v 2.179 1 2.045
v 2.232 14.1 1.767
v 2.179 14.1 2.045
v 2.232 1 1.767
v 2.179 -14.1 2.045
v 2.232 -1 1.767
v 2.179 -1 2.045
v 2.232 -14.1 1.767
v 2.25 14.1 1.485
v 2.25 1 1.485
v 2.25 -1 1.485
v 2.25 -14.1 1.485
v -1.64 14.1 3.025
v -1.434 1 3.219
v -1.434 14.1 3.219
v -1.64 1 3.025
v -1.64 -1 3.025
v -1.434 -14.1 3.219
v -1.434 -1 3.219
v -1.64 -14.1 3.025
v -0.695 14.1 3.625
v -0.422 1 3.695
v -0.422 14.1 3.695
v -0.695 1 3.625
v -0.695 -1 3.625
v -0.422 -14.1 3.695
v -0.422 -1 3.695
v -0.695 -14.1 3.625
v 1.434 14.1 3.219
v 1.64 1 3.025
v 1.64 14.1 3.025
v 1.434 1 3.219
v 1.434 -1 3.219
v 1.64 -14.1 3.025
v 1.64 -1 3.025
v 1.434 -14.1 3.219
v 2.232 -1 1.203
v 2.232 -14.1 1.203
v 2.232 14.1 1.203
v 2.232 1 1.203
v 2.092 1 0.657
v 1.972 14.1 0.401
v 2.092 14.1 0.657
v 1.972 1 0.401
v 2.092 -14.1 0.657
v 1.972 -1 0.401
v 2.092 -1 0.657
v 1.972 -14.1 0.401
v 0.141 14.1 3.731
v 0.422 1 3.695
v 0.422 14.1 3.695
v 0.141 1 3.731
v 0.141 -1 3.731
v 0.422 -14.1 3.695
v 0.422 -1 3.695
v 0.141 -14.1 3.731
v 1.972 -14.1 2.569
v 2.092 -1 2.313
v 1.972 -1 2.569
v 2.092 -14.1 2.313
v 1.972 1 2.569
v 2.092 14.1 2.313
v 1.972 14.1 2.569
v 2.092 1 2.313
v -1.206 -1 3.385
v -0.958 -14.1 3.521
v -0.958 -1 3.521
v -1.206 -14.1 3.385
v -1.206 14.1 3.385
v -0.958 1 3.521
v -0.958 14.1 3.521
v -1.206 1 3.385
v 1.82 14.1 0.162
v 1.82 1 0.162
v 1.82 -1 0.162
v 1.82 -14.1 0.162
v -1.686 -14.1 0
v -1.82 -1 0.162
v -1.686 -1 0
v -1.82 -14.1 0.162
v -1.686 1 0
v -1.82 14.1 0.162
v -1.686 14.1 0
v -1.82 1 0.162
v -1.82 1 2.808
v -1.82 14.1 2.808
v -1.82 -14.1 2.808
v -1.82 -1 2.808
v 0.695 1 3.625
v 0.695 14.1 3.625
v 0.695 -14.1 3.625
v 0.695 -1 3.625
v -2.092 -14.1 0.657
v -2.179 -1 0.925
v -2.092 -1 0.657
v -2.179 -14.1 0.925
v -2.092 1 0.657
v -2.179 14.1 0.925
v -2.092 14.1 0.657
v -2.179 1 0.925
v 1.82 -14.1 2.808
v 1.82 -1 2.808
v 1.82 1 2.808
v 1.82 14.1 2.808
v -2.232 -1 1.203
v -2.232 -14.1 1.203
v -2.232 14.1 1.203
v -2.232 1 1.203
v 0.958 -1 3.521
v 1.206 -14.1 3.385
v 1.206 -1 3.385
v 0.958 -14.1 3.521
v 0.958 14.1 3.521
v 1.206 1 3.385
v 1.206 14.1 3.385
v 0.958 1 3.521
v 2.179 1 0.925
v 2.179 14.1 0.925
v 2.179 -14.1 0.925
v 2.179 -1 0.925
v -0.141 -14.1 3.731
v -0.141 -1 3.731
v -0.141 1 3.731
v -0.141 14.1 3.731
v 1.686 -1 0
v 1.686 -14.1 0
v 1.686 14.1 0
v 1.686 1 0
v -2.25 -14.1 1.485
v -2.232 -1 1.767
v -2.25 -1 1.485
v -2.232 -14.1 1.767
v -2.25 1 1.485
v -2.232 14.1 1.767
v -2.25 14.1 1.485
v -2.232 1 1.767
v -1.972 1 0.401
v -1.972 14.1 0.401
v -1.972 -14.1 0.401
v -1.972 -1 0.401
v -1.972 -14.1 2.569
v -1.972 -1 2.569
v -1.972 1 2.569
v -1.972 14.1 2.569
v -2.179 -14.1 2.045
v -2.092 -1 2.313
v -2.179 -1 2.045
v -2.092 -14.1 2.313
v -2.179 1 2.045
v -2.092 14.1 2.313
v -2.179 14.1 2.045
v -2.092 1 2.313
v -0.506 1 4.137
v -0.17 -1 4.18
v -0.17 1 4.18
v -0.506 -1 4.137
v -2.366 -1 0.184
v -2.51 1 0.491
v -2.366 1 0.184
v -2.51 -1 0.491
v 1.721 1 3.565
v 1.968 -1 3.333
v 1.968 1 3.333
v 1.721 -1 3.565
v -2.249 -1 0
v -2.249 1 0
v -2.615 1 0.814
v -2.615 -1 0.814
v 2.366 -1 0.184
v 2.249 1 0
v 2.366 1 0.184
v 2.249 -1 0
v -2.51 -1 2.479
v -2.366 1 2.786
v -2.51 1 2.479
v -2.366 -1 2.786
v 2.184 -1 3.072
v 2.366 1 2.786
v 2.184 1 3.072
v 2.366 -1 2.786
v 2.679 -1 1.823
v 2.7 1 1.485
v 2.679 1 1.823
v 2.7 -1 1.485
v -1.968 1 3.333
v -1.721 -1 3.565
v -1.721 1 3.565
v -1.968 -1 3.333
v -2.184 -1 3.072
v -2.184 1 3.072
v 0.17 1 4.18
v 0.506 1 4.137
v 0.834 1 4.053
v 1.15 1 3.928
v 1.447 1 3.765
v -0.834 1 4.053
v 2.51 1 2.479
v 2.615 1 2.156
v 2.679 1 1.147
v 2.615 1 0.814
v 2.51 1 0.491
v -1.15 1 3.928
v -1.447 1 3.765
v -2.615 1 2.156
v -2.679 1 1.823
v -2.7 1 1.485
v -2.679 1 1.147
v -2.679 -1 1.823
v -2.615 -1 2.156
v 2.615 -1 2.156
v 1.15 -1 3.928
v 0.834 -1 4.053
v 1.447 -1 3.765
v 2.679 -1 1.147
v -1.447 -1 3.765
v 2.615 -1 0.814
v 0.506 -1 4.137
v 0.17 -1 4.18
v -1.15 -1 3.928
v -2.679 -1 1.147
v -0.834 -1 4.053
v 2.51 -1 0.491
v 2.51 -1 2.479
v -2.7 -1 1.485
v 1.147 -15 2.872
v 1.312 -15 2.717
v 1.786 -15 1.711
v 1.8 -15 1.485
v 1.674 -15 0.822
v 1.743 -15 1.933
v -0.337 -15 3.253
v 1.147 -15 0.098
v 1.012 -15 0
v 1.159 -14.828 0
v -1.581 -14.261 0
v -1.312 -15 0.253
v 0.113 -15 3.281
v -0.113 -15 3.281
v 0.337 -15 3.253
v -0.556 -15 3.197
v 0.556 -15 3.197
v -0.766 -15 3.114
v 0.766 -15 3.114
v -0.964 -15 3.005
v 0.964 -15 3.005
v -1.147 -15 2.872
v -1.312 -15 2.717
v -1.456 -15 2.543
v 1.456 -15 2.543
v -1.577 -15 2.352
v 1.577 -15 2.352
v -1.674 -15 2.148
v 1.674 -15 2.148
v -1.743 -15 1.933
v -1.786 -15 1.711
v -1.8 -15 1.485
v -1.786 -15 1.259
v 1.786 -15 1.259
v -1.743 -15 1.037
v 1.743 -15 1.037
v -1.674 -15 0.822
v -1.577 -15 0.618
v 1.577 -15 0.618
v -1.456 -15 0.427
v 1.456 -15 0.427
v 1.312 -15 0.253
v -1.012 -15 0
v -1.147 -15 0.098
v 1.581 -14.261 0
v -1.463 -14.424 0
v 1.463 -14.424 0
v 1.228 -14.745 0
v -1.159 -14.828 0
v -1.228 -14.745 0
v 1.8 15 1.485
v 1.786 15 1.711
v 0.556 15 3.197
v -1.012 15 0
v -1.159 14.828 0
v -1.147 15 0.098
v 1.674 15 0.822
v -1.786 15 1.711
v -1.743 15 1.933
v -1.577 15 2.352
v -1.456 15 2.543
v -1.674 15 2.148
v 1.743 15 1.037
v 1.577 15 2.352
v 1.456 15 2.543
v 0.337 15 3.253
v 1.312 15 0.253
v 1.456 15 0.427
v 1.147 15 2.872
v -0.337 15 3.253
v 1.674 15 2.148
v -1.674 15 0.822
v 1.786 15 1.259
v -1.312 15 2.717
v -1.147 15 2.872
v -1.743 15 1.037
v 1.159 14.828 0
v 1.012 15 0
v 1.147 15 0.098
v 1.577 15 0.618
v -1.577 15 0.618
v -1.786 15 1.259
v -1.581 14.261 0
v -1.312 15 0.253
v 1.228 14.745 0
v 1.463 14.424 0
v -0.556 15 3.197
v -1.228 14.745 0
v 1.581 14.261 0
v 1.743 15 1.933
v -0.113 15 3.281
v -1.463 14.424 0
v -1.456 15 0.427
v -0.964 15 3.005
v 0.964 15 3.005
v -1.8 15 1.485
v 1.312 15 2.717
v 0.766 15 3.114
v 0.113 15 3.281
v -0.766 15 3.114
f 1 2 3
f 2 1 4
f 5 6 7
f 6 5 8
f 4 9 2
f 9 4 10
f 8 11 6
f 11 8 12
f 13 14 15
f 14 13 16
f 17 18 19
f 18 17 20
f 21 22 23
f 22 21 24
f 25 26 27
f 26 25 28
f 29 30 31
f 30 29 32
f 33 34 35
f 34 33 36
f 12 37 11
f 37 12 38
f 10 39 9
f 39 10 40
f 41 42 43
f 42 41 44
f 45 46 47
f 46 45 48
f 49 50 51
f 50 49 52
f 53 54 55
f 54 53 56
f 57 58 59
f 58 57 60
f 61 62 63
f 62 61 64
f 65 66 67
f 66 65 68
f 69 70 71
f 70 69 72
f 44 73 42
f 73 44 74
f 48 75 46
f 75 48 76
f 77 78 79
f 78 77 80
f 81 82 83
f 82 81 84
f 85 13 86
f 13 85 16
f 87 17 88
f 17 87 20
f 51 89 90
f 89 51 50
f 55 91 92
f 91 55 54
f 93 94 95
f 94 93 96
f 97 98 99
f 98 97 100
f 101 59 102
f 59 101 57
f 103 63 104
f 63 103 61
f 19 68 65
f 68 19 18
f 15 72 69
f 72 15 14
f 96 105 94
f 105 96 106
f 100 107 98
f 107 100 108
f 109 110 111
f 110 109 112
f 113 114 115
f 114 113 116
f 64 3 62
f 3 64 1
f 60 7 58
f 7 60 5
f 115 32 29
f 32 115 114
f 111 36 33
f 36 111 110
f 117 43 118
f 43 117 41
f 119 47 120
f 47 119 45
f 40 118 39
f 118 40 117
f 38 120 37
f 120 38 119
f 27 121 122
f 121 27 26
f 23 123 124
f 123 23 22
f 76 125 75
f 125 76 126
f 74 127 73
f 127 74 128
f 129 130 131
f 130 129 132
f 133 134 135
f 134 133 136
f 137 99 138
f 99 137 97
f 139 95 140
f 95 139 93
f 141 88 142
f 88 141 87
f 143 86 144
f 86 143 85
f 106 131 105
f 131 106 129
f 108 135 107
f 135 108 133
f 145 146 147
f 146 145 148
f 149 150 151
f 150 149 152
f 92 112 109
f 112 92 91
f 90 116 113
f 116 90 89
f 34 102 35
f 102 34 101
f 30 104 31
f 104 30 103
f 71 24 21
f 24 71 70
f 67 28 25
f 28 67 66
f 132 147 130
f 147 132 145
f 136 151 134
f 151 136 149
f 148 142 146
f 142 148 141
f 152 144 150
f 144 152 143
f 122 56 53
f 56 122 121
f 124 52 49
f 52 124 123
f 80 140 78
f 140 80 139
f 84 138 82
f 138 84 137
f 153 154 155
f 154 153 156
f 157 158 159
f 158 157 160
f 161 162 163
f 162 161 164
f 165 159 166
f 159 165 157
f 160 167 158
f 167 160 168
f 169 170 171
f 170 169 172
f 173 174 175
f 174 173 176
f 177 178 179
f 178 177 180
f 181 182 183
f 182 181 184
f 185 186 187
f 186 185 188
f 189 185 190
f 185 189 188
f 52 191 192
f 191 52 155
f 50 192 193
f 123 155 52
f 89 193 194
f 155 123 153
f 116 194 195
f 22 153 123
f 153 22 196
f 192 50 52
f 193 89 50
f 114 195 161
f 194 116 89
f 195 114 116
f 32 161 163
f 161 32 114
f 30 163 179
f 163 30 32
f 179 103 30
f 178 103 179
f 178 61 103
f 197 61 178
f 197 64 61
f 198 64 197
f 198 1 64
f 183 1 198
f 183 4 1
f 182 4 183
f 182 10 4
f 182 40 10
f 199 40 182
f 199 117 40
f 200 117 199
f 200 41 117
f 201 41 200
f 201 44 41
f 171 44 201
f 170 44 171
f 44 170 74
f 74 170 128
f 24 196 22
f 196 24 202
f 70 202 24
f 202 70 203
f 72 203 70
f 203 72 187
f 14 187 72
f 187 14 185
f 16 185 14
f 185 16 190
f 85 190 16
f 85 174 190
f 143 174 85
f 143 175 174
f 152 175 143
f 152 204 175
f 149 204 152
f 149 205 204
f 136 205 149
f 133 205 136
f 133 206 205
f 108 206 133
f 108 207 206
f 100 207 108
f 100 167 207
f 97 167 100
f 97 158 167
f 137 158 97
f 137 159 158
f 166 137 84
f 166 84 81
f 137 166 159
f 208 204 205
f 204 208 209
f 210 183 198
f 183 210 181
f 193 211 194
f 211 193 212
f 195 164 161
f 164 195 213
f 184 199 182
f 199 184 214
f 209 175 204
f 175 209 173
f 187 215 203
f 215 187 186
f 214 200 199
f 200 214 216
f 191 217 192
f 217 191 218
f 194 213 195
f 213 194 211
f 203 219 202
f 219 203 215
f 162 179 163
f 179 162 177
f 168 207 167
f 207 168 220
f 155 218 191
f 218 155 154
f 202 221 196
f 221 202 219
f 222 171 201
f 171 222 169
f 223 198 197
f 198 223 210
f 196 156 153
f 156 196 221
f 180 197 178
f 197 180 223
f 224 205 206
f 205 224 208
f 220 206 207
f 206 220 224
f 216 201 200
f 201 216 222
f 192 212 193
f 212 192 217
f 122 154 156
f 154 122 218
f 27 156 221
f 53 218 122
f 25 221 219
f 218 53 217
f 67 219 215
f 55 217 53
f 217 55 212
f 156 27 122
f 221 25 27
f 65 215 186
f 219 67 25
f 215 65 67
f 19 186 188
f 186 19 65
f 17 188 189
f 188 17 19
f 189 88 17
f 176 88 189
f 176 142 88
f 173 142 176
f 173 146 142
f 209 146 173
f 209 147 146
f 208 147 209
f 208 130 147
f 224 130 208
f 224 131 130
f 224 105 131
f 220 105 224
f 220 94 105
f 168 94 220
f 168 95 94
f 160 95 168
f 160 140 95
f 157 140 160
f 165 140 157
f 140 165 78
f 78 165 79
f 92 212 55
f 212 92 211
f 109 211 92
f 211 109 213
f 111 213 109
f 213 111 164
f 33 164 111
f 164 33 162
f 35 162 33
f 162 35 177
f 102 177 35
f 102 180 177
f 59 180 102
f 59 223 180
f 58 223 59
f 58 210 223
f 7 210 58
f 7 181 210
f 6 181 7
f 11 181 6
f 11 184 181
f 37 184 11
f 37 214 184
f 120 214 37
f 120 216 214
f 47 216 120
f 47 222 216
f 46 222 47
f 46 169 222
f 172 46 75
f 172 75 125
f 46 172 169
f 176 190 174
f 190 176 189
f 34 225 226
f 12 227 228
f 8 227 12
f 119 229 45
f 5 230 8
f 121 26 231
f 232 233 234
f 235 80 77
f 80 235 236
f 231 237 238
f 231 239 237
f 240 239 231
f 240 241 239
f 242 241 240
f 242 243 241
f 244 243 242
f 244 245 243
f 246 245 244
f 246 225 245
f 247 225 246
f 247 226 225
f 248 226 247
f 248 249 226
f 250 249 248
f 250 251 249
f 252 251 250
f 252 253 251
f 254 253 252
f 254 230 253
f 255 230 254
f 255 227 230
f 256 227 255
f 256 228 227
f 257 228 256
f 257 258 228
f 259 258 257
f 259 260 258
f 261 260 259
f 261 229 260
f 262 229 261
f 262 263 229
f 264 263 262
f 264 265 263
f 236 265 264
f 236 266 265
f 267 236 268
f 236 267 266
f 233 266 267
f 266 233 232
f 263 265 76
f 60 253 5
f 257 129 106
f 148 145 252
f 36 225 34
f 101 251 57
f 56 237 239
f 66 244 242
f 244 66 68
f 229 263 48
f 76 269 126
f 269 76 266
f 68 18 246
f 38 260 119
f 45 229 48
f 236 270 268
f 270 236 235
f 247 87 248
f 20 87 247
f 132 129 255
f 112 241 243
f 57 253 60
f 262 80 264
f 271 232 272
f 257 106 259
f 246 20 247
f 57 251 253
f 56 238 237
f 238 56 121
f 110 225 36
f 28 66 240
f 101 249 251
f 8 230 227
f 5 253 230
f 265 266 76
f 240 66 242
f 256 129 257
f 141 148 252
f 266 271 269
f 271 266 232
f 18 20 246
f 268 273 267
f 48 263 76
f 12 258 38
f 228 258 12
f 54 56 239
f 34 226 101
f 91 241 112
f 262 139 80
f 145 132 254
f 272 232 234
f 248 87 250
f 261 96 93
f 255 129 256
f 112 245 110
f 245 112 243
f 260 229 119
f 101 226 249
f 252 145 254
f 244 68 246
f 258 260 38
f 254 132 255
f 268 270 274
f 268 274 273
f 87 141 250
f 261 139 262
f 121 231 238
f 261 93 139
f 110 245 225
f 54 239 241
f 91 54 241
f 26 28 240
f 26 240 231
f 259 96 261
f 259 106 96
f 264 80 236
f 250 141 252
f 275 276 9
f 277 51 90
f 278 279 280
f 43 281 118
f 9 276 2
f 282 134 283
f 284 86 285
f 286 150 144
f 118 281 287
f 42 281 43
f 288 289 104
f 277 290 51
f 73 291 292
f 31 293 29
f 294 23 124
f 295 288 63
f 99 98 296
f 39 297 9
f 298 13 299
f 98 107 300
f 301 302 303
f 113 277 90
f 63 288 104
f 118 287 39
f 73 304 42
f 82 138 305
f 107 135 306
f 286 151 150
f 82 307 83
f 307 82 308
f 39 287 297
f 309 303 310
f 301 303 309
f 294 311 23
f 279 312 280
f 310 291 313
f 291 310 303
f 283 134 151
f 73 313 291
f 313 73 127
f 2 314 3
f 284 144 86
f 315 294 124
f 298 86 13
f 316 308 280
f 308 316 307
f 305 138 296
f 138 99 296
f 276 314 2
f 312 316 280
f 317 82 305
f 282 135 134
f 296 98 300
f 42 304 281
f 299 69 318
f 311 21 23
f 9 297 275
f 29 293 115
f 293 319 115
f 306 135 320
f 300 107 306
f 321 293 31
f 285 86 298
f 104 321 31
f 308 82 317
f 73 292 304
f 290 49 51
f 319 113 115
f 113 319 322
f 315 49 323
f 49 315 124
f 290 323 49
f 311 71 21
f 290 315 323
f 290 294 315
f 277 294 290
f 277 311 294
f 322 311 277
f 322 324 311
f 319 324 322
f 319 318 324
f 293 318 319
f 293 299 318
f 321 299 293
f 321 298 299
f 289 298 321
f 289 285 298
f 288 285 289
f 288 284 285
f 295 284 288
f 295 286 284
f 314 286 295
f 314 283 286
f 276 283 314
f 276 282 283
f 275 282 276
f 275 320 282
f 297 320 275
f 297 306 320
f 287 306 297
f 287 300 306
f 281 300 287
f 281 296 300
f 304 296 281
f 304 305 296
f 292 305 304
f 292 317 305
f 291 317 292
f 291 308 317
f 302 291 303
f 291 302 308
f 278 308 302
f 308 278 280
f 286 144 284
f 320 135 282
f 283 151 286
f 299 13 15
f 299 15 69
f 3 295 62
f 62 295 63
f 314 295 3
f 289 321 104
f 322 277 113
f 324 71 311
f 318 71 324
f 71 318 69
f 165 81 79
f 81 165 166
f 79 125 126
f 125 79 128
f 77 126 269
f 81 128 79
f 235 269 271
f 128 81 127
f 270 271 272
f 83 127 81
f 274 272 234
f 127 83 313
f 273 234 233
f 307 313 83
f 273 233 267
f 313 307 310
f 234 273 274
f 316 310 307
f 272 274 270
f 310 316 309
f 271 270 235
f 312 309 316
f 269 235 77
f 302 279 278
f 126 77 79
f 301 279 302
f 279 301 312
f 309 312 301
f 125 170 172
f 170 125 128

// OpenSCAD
$fn=50;

pinDia=4.5;
pinLen=30;

difference(){
  translate([0,0,pinDia*0.33]) rotate([90,0,0]){
    cylinder(d=pinDia,h=pinLen-pinDia*0.4,center=true);
    cylinder(d=pinDia*1.2,h=2,center=true);
    translate([0,0,pinLen/2-pinDia*0.2]) cylinder(d1=pinDia,d2=pinDia*0.8,h=pinDia*0.2);
    mirror([0,0,1]) translate([0,0,pinLen/2-pinDia*0.2]) cylinder(d1=pinDia,d2=pinDia*0.8,h=pinDia*0.2);
  }
  
  translate([0,0,-pinDia/2]) cube([pinDia*1.2,pinLen+0.1,pinDia],true); 
}
